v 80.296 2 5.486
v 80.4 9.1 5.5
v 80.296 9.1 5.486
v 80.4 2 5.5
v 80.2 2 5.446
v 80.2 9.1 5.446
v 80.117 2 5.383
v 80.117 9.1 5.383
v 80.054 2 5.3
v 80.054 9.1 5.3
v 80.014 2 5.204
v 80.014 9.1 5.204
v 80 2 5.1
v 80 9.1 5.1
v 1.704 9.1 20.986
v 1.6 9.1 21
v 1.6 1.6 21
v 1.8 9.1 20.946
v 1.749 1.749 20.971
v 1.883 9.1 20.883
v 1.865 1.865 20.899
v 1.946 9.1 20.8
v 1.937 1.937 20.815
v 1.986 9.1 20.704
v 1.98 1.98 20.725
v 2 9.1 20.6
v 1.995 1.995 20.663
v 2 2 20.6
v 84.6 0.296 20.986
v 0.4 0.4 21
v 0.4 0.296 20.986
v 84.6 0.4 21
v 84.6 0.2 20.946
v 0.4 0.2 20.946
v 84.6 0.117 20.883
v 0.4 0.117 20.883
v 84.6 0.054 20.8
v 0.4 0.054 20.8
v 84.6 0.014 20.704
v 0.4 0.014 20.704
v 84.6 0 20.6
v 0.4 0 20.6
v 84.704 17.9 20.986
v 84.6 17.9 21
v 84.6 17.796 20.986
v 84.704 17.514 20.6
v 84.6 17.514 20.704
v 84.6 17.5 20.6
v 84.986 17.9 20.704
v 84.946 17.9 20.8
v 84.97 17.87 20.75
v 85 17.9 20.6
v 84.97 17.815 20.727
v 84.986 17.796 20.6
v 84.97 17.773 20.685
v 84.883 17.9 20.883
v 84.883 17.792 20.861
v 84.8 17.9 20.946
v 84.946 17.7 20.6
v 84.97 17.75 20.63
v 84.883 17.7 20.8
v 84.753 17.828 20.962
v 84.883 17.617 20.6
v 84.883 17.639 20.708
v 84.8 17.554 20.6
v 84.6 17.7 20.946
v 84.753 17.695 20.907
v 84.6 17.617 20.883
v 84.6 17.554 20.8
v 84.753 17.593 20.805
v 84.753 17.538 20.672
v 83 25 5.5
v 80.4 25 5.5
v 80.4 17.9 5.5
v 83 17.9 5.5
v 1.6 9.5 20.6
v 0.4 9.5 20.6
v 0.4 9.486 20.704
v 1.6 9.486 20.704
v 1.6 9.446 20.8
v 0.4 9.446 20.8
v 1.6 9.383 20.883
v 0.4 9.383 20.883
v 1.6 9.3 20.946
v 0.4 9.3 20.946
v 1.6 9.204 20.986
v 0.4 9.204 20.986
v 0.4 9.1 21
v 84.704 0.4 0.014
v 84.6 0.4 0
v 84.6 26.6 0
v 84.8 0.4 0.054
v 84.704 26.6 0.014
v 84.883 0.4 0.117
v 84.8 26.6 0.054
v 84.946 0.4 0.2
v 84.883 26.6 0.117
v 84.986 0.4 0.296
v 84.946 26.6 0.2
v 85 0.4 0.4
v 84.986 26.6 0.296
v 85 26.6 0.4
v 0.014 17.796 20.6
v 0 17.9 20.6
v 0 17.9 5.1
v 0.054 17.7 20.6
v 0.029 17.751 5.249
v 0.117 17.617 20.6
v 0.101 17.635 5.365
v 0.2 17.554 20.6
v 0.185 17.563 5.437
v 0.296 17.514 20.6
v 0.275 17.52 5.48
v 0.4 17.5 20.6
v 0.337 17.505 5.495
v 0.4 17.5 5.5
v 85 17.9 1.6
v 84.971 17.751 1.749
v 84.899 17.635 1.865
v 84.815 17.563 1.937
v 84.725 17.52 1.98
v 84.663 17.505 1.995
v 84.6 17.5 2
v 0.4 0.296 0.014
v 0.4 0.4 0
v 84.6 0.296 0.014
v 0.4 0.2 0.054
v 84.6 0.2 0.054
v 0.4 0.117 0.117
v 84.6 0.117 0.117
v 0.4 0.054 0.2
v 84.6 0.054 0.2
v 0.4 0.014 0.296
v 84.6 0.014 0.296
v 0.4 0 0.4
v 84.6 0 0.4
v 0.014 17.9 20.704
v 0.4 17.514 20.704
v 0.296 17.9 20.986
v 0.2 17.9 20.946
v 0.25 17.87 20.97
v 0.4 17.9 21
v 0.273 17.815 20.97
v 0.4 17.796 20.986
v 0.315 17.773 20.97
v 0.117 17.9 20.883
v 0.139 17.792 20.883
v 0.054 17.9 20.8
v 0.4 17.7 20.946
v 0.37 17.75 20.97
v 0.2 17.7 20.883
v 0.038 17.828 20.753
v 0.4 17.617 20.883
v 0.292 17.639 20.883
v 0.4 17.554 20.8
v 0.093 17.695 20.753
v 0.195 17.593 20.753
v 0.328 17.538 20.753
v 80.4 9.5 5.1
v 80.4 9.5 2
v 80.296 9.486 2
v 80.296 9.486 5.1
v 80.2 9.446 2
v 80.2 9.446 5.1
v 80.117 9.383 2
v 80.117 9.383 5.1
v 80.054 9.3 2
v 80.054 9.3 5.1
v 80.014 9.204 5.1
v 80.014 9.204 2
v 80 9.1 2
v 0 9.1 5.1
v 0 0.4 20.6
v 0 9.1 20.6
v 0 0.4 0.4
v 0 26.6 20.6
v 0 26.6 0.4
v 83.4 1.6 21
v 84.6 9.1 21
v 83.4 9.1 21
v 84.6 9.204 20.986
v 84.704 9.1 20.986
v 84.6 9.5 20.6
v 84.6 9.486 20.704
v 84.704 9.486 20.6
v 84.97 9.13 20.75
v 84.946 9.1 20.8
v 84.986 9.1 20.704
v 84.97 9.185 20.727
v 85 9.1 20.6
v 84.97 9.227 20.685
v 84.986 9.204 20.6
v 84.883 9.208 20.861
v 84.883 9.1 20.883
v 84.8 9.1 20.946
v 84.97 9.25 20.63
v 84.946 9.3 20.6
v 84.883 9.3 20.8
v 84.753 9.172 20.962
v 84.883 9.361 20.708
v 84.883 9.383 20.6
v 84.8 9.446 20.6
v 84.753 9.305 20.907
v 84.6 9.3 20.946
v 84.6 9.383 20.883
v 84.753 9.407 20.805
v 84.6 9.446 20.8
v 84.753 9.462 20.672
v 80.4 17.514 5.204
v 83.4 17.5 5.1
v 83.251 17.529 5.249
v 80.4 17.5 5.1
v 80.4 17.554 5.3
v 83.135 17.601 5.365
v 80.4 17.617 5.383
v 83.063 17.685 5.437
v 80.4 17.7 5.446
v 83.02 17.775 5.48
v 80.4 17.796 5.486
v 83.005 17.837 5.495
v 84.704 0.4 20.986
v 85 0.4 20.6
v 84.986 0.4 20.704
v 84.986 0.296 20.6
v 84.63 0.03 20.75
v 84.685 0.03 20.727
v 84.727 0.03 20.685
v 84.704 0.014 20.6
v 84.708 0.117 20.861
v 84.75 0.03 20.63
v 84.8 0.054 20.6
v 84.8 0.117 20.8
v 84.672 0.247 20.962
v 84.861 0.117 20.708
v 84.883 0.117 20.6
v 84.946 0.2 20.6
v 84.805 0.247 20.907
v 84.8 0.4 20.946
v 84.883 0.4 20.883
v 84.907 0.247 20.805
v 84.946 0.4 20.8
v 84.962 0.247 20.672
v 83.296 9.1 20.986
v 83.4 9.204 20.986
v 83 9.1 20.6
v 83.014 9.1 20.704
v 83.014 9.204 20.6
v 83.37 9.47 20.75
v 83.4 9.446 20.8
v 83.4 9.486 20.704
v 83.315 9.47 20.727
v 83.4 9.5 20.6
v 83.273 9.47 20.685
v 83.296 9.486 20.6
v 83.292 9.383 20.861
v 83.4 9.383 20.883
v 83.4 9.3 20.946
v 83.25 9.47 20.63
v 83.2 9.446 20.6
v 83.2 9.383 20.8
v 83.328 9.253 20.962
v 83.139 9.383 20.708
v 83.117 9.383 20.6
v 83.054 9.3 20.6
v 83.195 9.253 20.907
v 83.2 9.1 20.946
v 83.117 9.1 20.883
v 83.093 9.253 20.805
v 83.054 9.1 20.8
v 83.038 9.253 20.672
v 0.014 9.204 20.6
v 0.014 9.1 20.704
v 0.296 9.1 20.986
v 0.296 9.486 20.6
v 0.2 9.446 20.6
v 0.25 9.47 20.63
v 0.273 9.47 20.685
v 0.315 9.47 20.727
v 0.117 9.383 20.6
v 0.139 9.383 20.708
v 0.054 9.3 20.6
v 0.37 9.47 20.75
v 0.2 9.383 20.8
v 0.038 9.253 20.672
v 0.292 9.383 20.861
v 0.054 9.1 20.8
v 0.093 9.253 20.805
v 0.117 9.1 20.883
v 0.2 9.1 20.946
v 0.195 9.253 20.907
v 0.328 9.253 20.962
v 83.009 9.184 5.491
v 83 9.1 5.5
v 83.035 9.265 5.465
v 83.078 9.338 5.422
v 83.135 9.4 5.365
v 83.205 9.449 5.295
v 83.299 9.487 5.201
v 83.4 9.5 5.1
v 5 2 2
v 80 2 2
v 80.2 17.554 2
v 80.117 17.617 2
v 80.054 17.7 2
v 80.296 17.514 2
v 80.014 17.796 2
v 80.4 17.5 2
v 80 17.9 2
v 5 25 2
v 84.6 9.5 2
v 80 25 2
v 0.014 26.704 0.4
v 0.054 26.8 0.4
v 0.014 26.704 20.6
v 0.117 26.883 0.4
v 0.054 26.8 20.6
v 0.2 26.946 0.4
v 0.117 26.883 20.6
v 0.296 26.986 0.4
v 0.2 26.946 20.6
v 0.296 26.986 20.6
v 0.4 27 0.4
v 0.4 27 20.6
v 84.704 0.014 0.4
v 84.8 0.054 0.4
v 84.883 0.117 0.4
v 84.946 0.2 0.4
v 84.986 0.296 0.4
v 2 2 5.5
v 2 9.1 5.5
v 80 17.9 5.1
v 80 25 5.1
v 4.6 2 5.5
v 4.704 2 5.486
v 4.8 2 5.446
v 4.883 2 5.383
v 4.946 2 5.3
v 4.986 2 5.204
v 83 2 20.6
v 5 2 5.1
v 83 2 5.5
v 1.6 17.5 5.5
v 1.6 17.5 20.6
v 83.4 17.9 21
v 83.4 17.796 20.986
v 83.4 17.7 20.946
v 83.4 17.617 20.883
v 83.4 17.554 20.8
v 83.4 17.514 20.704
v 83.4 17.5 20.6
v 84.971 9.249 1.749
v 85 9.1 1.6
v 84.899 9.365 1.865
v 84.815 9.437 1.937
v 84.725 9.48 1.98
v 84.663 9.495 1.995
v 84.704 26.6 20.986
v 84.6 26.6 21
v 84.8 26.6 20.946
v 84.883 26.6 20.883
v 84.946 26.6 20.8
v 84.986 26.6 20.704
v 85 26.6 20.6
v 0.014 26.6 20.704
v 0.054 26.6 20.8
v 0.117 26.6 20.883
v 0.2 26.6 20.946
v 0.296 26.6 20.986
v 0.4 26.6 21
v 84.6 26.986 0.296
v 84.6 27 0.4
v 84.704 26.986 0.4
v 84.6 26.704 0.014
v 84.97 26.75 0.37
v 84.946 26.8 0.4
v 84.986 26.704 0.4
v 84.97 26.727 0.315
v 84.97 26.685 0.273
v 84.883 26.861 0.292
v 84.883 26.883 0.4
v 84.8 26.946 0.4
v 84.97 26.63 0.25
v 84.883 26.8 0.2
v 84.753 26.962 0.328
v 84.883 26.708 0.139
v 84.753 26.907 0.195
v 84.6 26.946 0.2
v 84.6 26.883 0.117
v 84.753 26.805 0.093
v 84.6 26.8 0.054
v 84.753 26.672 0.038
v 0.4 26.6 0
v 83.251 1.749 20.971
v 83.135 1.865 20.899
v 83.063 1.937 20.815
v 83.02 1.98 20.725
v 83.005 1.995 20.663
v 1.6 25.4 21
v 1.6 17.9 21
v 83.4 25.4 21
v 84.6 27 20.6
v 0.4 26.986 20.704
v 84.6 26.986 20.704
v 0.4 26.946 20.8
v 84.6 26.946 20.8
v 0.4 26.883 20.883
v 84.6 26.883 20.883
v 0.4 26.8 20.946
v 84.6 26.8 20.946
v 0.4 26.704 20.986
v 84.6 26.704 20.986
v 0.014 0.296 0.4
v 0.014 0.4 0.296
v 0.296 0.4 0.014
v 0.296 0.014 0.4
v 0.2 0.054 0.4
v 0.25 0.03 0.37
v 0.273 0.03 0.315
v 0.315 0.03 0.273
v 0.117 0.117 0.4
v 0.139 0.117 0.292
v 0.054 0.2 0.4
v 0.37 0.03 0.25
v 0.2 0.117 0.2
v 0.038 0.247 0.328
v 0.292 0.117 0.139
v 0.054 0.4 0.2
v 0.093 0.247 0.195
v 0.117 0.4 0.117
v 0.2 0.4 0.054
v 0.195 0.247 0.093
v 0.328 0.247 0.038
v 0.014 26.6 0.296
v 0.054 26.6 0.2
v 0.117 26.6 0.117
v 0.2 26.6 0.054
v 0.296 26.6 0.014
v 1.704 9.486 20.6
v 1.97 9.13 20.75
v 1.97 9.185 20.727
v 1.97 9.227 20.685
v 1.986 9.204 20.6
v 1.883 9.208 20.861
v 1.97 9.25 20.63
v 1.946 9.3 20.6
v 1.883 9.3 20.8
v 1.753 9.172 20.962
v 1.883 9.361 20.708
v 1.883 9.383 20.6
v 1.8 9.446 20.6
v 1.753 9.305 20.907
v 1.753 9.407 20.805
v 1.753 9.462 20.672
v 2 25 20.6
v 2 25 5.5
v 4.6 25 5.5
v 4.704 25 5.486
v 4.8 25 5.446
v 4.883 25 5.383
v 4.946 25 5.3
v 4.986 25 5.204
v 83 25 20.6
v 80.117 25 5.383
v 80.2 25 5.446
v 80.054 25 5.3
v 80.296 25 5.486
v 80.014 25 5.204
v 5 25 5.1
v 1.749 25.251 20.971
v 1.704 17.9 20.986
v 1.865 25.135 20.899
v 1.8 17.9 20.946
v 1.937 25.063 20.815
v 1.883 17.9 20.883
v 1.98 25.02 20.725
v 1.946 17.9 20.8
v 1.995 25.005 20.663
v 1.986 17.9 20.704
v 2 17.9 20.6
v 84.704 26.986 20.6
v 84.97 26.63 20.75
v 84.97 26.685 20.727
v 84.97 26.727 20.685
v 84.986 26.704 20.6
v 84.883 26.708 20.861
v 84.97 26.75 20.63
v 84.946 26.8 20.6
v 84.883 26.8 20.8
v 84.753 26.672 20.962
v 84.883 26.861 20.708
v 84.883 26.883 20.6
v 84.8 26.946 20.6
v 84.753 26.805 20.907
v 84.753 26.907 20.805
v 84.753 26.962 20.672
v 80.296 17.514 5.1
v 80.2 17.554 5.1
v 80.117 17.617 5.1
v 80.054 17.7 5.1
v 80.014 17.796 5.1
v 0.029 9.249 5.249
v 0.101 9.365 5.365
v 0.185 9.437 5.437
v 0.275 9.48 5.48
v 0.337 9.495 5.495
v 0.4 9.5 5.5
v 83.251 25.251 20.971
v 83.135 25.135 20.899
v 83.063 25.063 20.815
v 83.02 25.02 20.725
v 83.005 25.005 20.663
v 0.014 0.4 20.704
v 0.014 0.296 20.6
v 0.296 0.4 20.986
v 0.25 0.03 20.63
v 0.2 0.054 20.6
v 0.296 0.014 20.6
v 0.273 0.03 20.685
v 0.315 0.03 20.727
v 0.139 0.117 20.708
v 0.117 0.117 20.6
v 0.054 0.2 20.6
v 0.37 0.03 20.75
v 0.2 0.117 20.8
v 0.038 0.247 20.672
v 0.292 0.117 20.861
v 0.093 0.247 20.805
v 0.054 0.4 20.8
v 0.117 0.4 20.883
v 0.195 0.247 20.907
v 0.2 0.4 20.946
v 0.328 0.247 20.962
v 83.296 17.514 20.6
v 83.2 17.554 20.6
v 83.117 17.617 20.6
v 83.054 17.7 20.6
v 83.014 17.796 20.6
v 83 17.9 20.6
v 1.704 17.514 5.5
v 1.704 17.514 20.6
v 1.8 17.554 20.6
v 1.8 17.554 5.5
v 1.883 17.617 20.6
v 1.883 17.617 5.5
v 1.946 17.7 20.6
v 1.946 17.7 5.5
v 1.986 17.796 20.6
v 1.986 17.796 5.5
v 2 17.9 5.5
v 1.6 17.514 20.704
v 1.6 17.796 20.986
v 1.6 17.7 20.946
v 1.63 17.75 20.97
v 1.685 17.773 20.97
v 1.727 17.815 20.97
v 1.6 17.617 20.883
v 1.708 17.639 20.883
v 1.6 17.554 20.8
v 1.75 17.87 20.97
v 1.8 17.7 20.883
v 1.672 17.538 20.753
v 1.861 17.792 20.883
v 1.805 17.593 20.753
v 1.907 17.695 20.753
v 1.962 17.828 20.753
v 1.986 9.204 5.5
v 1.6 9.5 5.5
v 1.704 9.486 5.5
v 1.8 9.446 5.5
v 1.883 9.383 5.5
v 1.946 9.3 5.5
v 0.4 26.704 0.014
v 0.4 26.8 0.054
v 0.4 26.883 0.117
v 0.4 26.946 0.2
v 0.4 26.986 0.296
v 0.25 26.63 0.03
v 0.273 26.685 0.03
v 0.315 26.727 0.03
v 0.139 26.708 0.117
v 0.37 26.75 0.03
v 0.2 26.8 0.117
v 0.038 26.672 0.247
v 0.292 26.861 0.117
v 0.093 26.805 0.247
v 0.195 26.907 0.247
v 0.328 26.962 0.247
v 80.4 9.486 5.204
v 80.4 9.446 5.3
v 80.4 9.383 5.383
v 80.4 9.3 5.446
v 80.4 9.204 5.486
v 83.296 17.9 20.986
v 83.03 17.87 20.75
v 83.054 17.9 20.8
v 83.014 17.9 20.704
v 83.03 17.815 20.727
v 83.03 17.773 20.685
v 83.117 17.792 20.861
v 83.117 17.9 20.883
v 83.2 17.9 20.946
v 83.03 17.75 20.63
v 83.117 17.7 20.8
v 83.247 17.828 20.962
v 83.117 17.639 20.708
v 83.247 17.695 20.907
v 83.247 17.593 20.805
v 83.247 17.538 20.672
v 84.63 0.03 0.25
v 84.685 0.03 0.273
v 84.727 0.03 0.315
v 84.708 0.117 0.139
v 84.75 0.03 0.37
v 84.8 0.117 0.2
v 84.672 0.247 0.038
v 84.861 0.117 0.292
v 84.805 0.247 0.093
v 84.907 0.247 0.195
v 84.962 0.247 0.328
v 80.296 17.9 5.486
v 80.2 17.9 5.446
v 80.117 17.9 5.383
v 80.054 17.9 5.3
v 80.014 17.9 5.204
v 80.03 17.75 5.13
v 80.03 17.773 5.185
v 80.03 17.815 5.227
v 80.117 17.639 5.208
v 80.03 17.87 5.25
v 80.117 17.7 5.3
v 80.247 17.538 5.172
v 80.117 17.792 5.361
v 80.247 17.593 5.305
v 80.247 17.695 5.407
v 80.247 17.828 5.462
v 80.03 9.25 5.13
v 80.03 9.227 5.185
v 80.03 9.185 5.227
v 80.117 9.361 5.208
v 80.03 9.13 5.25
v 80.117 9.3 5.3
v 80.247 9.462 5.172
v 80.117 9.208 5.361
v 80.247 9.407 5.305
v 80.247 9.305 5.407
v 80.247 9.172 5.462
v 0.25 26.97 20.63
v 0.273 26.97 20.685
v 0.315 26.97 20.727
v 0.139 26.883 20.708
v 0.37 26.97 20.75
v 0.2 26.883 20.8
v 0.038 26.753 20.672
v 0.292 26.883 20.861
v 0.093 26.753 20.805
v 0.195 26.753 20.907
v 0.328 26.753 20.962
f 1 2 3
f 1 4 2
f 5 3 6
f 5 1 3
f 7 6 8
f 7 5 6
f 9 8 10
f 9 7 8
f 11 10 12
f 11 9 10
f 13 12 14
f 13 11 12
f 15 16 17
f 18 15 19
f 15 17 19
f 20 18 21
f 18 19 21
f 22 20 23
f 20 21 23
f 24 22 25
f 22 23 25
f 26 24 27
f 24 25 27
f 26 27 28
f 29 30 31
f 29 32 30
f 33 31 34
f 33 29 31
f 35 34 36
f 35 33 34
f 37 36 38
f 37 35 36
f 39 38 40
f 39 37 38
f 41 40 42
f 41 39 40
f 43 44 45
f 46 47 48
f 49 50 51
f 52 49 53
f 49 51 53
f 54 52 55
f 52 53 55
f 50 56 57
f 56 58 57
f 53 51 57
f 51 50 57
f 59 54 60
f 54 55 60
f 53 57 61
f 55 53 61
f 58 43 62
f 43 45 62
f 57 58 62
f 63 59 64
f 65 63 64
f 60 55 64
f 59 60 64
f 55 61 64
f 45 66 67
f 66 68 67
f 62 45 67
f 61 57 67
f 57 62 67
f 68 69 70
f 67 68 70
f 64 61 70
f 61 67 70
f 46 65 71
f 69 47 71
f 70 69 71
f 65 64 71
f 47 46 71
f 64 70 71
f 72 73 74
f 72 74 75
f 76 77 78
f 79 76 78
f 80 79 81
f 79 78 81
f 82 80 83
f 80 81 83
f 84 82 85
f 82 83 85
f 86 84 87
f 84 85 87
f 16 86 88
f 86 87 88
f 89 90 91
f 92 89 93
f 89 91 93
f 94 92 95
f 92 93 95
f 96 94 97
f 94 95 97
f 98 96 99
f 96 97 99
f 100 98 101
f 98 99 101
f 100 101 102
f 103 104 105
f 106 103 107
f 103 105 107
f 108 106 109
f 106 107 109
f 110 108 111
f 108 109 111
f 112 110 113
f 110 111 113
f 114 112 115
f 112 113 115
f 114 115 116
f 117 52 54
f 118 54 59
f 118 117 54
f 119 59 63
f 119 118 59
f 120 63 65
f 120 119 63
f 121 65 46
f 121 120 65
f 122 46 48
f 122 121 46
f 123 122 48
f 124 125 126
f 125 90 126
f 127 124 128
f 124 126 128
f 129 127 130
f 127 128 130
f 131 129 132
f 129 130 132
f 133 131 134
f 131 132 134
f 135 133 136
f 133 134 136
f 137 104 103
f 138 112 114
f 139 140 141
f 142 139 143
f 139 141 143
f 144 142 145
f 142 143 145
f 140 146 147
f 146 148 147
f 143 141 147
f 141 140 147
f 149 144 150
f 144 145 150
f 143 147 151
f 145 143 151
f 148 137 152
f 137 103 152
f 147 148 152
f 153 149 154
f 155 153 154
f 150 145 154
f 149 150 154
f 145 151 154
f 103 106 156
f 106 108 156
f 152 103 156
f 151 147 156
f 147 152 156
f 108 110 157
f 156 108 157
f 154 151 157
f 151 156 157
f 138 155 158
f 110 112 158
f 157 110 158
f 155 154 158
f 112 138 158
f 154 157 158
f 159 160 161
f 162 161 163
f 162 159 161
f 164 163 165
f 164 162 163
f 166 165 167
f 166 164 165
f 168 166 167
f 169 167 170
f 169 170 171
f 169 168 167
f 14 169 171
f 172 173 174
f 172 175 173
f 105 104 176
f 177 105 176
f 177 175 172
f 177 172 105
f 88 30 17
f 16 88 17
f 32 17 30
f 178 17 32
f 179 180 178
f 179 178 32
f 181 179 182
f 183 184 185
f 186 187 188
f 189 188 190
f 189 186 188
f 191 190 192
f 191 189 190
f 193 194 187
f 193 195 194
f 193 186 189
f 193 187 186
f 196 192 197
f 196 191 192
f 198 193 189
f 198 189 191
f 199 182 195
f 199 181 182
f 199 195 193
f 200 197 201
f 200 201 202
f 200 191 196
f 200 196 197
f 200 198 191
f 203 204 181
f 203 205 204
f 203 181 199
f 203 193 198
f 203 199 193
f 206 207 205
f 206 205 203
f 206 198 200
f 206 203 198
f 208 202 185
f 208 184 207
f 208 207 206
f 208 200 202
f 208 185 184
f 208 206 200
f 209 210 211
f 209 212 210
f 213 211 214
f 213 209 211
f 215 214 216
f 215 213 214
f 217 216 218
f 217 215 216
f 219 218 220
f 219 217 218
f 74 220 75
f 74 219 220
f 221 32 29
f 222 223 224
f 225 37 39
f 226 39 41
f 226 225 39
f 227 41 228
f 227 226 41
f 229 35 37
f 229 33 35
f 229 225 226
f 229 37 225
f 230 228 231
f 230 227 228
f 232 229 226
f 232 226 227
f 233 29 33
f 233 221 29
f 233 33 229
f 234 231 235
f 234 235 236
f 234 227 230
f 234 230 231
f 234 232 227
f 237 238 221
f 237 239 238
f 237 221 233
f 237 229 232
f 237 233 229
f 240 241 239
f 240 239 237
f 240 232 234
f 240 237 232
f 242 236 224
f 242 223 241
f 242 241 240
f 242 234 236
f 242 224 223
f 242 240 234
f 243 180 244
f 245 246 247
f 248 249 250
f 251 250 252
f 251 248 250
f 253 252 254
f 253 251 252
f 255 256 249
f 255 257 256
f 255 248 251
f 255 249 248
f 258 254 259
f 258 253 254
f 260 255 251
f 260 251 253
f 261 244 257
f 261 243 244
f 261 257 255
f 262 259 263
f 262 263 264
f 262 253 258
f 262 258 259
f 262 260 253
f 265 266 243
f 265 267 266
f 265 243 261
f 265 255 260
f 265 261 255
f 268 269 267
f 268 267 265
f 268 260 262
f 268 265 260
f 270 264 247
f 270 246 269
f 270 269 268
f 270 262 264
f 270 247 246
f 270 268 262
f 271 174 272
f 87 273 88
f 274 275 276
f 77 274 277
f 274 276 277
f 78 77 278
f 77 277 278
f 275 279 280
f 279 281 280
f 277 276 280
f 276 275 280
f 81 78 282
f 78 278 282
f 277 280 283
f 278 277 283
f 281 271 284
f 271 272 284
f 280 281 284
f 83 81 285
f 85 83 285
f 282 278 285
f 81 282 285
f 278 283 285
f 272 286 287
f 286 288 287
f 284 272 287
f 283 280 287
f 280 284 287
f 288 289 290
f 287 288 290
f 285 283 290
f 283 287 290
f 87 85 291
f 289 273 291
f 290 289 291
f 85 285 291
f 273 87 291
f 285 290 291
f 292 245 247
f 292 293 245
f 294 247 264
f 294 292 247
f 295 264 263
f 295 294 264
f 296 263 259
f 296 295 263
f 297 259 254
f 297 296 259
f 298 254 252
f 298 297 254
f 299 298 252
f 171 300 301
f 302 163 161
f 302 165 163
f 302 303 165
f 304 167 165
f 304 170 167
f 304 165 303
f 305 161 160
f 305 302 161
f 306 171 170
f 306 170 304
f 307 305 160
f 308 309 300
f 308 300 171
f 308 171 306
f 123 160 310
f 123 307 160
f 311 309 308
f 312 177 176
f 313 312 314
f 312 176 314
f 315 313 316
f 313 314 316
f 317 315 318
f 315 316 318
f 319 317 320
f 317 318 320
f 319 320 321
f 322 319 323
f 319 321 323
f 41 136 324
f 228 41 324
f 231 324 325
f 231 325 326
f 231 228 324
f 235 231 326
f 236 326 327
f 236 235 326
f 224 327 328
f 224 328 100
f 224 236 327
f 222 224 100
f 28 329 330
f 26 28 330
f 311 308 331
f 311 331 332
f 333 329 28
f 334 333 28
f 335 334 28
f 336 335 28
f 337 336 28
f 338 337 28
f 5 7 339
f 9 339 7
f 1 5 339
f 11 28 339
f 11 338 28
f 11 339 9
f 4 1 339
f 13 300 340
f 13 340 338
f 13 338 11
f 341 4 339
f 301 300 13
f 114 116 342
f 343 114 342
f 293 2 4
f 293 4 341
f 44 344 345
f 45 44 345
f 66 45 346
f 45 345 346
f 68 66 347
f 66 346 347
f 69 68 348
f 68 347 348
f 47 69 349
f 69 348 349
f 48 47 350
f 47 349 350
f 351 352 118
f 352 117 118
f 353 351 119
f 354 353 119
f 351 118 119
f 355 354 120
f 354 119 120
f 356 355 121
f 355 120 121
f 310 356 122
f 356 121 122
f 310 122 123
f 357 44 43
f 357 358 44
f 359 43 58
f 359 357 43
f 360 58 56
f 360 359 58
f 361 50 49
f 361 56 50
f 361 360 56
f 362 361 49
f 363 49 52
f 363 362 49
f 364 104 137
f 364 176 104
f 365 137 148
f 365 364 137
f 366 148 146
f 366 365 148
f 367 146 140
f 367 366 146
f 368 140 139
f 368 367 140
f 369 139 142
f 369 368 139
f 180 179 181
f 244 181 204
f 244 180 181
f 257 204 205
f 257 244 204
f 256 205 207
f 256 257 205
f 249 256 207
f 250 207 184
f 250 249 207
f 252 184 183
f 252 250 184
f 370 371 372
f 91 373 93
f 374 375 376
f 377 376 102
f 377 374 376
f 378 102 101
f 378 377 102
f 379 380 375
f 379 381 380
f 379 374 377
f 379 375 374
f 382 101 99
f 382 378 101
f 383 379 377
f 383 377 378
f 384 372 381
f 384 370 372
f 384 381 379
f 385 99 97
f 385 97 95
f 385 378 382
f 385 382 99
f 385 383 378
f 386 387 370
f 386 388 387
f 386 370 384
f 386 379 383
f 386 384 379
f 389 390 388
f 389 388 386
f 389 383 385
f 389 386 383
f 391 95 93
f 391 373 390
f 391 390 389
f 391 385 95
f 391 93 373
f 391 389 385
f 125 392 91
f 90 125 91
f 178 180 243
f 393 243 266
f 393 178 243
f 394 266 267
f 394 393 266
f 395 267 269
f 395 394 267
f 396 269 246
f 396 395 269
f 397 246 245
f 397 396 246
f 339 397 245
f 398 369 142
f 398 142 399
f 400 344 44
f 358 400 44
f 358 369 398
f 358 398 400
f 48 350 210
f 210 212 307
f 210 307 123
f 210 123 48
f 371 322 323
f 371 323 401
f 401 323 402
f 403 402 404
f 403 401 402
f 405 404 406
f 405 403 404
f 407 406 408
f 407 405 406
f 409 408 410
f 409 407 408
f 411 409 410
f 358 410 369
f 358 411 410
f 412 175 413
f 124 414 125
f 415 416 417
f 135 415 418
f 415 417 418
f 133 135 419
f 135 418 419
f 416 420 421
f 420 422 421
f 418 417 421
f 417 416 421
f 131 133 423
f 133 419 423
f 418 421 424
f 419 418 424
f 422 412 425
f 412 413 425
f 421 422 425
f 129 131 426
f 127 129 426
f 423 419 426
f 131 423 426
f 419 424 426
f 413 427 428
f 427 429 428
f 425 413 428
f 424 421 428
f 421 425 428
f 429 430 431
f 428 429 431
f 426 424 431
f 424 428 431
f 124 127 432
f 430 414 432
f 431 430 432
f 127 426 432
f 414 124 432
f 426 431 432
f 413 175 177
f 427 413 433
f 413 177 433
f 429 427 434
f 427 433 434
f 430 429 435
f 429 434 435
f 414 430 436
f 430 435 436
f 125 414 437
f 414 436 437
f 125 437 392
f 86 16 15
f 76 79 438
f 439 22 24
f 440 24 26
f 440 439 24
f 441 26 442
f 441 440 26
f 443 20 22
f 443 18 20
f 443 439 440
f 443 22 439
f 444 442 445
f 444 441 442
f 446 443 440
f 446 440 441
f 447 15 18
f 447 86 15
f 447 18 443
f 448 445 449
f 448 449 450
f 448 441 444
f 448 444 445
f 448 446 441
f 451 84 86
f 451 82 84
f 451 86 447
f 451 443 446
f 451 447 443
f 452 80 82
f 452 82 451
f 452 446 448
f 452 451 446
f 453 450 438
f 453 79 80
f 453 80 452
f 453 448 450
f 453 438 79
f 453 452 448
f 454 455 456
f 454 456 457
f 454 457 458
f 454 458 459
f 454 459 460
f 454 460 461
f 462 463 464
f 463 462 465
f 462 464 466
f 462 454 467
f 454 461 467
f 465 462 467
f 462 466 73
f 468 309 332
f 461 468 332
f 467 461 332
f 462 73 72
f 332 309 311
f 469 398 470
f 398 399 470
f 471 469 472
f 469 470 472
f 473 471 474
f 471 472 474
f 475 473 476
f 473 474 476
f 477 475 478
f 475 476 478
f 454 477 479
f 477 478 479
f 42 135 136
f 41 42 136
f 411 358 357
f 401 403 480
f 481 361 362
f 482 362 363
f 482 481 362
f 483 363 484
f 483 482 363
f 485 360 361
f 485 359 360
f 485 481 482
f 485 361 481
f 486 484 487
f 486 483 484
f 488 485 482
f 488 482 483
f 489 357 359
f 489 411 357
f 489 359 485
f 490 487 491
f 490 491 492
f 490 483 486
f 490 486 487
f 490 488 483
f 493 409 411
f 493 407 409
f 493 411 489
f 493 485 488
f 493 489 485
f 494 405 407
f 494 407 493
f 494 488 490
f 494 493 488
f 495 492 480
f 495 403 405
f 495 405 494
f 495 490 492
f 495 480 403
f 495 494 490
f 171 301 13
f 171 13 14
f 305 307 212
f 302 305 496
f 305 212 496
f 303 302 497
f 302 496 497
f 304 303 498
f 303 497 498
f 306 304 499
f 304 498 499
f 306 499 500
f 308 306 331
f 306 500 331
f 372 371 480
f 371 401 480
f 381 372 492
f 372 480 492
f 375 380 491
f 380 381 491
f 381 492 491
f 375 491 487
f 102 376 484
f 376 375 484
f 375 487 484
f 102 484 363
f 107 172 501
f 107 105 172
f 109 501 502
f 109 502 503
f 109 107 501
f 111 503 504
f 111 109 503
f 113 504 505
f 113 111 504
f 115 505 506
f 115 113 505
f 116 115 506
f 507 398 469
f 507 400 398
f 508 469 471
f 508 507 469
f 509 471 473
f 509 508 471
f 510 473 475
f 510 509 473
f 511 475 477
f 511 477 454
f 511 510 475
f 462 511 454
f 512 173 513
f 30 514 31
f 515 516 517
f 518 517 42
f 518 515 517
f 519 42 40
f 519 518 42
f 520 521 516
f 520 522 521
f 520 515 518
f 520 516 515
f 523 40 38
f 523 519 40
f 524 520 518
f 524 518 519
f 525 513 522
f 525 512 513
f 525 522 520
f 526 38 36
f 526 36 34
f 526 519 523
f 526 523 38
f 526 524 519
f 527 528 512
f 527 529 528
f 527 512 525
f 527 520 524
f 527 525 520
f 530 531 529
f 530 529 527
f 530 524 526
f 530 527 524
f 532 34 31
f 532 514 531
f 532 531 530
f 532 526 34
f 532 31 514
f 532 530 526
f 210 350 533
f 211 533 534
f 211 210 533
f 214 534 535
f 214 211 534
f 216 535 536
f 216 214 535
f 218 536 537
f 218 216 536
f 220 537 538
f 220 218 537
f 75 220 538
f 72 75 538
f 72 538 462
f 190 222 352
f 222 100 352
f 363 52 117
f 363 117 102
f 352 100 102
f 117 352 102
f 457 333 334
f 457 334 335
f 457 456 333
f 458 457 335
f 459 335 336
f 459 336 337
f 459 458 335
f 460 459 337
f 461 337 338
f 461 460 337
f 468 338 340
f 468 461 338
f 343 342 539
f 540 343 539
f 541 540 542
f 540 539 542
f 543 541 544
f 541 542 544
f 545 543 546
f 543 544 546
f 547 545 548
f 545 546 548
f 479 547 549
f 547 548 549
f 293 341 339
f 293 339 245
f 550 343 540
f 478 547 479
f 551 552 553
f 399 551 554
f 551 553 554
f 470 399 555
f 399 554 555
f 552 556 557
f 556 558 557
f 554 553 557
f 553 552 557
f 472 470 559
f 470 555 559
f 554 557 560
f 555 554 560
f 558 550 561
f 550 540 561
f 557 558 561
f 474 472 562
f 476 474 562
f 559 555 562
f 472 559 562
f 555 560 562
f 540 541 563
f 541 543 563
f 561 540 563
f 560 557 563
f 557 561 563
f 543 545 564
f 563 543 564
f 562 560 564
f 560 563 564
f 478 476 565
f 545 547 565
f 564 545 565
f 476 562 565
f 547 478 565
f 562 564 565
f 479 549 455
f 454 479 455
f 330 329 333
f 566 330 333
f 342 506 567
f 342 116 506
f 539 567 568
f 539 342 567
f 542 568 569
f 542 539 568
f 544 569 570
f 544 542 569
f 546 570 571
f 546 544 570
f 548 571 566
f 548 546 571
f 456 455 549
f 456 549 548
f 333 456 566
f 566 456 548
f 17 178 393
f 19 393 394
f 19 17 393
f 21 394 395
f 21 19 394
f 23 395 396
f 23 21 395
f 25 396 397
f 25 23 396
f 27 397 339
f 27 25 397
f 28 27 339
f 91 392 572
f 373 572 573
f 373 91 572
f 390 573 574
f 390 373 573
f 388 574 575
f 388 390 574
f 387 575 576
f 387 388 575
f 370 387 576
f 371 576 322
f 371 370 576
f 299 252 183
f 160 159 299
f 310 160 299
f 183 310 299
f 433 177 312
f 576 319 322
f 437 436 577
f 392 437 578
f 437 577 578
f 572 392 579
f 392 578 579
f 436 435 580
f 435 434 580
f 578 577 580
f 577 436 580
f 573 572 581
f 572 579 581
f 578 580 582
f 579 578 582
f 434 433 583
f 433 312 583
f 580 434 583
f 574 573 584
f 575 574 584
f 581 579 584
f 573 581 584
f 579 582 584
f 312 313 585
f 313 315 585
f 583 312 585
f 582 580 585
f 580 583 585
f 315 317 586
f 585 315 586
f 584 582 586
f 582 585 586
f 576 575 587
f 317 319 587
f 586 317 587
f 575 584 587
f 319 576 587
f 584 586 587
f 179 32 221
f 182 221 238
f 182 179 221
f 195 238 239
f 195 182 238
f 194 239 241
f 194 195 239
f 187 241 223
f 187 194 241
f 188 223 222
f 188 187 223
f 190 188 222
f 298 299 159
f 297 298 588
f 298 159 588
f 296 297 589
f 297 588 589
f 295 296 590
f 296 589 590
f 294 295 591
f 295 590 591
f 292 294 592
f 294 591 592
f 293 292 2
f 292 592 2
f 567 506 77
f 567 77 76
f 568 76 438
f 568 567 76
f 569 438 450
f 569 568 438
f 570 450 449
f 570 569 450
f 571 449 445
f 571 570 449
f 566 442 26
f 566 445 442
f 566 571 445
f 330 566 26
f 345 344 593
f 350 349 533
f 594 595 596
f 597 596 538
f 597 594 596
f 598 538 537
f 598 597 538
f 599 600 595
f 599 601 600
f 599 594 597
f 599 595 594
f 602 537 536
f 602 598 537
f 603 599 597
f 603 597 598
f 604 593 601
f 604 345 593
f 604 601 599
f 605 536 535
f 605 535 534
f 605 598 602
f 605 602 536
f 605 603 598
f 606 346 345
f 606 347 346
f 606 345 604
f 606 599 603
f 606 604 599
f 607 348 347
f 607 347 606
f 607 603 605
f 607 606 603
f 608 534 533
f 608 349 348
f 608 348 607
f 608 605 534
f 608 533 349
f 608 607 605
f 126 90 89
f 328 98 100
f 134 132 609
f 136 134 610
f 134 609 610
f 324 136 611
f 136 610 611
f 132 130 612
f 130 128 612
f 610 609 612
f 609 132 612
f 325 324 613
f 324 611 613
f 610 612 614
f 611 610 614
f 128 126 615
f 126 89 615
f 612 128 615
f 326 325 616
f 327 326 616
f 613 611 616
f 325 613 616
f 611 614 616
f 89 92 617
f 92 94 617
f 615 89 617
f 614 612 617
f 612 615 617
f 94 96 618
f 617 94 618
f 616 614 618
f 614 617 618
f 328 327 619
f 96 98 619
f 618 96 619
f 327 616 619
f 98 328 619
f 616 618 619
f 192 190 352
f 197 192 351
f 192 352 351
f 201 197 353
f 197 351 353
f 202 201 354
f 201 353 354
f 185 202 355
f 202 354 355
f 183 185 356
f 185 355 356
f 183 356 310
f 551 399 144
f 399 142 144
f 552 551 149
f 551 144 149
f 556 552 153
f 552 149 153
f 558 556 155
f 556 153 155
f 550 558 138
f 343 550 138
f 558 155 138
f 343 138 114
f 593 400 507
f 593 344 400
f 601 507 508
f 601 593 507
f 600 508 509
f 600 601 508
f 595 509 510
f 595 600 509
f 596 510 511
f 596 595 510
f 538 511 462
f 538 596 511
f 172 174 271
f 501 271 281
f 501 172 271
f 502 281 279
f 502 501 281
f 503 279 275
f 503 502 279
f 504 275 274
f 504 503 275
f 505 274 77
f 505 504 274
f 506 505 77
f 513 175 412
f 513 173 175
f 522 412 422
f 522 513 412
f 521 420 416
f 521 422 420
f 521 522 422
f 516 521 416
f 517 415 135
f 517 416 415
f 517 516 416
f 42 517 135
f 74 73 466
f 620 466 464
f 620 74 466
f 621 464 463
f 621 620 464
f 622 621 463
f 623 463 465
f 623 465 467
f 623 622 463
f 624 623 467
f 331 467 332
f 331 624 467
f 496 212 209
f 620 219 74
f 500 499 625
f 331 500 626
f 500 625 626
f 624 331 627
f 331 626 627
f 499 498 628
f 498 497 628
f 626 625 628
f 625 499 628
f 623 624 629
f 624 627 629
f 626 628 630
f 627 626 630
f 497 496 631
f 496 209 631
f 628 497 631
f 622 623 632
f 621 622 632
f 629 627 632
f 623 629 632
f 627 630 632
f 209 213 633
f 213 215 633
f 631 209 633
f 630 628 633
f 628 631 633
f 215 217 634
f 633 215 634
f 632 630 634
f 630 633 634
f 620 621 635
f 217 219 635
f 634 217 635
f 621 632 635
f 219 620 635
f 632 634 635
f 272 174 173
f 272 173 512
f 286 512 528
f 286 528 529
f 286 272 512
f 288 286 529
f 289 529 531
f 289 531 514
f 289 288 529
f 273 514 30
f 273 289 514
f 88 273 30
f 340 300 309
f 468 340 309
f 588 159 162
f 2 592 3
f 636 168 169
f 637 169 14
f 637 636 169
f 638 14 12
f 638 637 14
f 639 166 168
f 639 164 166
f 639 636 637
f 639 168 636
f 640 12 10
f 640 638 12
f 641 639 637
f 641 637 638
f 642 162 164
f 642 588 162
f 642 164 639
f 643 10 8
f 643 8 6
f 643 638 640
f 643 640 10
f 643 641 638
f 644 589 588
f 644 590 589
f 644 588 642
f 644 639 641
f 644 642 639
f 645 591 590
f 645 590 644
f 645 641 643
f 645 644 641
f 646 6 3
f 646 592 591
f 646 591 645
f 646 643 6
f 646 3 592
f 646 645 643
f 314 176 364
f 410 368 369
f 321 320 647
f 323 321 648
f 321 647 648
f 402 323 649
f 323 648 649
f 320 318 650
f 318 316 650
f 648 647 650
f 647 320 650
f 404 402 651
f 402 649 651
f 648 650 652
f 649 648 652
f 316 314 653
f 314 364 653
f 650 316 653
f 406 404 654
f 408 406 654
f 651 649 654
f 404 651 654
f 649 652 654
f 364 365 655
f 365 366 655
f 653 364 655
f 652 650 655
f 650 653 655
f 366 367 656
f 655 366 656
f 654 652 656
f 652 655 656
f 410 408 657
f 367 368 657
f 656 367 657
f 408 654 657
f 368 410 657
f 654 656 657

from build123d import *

# Parameters (mm, degrees)
BOX004_W     = 10
BOX004_H     = 8
BOX004_DEPTH = 30
BOX003_W     = 10
BOX003_H     = 8
BOX003_DEPTH = 30
BOX001_W     = 75
BOX001_H     = 23
BOX001_DEPTH = 30
BOX002_W     = 81
BOX002_H     = 23
BOX002_DEPTH = 30
BOX_W        = 85
BOX_H        = 27
BOX_DEPTH    = 21
FILLET_R     = 0.4


with BuildPart() as cube004:
    # Box004 → Box004 (new body)
    with BuildSketch(Plane(origin=(80, 9.5, 2), x_dir=(1, 0, 0), z_dir=(0, 0, 1))):
        with Locations((5, 4)):
            Rectangle(BOX004_W, BOX004_H)
    extrude(amount=BOX004_DEPTH)


with BuildPart() as cube003:
    # Box003 → Box003 (new body)
    with BuildSketch(Plane(origin=(-2, 9.5, 5.5), x_dir=(1, 0, 0), z_dir=(0, 0, 1))):
        with Locations((5, 4)):
            Rectangle(BOX003_W, BOX003_H)
    extrude(amount=BOX003_DEPTH)


with BuildPart() as cube001:
    # Box001 → Box001 (new body)
    with BuildSketch(Plane(origin=(5, 2, 2), x_dir=(1, 0, 0), z_dir=(0, 0, 1))):
        with Locations((37.5, 11.5)):
            Rectangle(BOX001_W, BOX001_H)
    extrude(amount=BOX001_DEPTH)


with BuildPart() as cube002:
    # Box002 → Box002 (new body)
    with BuildSketch(Plane(origin=(2, 2, 5.5), x_dir=(1, 0, 0), z_dir=(0, 0, 1))):
        with Locations((40.5, 11.5)):
            Rectangle(BOX002_W, BOX002_H)
    extrude(amount=BOX002_DEPTH)


with BuildPart() as fillet_body:
    # Box → Box (new body)
    with BuildSketch(Plane.XY):
        with Locations((42.5, 13.5)):
            Rectangle(BOX_W, BOX_H)
    extrude(amount=BOX_DEPTH)

    # Cut: cut Cube002
    add(cube002.part, mode=Mode.SUBTRACT)

    # Cut001: cut Cube001
    add(cube001.part, mode=Mode.SUBTRACT)

    # Cut002: cut Cube003
    add(cube003.part, mode=Mode.SUBTRACT)

    # Cut003: cut Cube004
    add(cube004.part, mode=Mode.SUBTRACT)

    # Fillet
    fillet_edges = [fillet_body.edges().sort_by_distance(p)[0] for p in [
        (0, 4.75, 21),
        (0, 9.5, 13.25),
        (0, 13.5, 5.5),
        (0, 17.5, 13.25),
        (0, 22.25, 21),
        (0, 27, 10.5),
        (0, 13.5, 0),
        (0, 0, 10.5),
        (1, 9.5, 21),
        (2, 5.75, 21),
        (3.5, 2, 21),
        (42.5, 2, 21),
        (81.5, 2, 21),
        (83, 5.75, 21),
        (84, 9.5, 21),
        (85, 4.75, 21),
        (42.5, 0, 21),
        (2, 9.5, 13.25),
        (2, 17.5, 13.25),
        (1, 17.5, 21),
        (84, 17.5, 21),
        (83, 21.25, 21),
        (81.5, 25, 21),
        (42.5, 25, 21),
        (3.5, 25, 21),
        (2, 21.25, 21),
        (42.5, 27, 21),
        (85, 22.25, 21),
        (42.5, 27, 0),
        (85, 27, 10.5),
        (85, 13.5, 0),
        (42.5, 0, 0),
        (85, 0, 10.5),
        (83, 9.5, 13.25),
        (85, 9.5, 11.5),
        (81.5, 9.5, 5.5),
        (80, 9.5, 3.75),
        (85, 13.5, 2),
        (85, 17.5, 11.5),
        (5, 13.5, 5.5),
        (83, 17.5, 13.25),
        (81.5, 17.5, 5.5),
        (80, 17.5, 3.75),
        (5, 5.75, 5.5),
        (80, 5.75, 5.5),
        (5, 21.25, 5.5),
        (80, 21.25, 5.5),
    ]]
    fillet(fillet_edges, radius=FILLET_R)


solid = fillet_body.part
